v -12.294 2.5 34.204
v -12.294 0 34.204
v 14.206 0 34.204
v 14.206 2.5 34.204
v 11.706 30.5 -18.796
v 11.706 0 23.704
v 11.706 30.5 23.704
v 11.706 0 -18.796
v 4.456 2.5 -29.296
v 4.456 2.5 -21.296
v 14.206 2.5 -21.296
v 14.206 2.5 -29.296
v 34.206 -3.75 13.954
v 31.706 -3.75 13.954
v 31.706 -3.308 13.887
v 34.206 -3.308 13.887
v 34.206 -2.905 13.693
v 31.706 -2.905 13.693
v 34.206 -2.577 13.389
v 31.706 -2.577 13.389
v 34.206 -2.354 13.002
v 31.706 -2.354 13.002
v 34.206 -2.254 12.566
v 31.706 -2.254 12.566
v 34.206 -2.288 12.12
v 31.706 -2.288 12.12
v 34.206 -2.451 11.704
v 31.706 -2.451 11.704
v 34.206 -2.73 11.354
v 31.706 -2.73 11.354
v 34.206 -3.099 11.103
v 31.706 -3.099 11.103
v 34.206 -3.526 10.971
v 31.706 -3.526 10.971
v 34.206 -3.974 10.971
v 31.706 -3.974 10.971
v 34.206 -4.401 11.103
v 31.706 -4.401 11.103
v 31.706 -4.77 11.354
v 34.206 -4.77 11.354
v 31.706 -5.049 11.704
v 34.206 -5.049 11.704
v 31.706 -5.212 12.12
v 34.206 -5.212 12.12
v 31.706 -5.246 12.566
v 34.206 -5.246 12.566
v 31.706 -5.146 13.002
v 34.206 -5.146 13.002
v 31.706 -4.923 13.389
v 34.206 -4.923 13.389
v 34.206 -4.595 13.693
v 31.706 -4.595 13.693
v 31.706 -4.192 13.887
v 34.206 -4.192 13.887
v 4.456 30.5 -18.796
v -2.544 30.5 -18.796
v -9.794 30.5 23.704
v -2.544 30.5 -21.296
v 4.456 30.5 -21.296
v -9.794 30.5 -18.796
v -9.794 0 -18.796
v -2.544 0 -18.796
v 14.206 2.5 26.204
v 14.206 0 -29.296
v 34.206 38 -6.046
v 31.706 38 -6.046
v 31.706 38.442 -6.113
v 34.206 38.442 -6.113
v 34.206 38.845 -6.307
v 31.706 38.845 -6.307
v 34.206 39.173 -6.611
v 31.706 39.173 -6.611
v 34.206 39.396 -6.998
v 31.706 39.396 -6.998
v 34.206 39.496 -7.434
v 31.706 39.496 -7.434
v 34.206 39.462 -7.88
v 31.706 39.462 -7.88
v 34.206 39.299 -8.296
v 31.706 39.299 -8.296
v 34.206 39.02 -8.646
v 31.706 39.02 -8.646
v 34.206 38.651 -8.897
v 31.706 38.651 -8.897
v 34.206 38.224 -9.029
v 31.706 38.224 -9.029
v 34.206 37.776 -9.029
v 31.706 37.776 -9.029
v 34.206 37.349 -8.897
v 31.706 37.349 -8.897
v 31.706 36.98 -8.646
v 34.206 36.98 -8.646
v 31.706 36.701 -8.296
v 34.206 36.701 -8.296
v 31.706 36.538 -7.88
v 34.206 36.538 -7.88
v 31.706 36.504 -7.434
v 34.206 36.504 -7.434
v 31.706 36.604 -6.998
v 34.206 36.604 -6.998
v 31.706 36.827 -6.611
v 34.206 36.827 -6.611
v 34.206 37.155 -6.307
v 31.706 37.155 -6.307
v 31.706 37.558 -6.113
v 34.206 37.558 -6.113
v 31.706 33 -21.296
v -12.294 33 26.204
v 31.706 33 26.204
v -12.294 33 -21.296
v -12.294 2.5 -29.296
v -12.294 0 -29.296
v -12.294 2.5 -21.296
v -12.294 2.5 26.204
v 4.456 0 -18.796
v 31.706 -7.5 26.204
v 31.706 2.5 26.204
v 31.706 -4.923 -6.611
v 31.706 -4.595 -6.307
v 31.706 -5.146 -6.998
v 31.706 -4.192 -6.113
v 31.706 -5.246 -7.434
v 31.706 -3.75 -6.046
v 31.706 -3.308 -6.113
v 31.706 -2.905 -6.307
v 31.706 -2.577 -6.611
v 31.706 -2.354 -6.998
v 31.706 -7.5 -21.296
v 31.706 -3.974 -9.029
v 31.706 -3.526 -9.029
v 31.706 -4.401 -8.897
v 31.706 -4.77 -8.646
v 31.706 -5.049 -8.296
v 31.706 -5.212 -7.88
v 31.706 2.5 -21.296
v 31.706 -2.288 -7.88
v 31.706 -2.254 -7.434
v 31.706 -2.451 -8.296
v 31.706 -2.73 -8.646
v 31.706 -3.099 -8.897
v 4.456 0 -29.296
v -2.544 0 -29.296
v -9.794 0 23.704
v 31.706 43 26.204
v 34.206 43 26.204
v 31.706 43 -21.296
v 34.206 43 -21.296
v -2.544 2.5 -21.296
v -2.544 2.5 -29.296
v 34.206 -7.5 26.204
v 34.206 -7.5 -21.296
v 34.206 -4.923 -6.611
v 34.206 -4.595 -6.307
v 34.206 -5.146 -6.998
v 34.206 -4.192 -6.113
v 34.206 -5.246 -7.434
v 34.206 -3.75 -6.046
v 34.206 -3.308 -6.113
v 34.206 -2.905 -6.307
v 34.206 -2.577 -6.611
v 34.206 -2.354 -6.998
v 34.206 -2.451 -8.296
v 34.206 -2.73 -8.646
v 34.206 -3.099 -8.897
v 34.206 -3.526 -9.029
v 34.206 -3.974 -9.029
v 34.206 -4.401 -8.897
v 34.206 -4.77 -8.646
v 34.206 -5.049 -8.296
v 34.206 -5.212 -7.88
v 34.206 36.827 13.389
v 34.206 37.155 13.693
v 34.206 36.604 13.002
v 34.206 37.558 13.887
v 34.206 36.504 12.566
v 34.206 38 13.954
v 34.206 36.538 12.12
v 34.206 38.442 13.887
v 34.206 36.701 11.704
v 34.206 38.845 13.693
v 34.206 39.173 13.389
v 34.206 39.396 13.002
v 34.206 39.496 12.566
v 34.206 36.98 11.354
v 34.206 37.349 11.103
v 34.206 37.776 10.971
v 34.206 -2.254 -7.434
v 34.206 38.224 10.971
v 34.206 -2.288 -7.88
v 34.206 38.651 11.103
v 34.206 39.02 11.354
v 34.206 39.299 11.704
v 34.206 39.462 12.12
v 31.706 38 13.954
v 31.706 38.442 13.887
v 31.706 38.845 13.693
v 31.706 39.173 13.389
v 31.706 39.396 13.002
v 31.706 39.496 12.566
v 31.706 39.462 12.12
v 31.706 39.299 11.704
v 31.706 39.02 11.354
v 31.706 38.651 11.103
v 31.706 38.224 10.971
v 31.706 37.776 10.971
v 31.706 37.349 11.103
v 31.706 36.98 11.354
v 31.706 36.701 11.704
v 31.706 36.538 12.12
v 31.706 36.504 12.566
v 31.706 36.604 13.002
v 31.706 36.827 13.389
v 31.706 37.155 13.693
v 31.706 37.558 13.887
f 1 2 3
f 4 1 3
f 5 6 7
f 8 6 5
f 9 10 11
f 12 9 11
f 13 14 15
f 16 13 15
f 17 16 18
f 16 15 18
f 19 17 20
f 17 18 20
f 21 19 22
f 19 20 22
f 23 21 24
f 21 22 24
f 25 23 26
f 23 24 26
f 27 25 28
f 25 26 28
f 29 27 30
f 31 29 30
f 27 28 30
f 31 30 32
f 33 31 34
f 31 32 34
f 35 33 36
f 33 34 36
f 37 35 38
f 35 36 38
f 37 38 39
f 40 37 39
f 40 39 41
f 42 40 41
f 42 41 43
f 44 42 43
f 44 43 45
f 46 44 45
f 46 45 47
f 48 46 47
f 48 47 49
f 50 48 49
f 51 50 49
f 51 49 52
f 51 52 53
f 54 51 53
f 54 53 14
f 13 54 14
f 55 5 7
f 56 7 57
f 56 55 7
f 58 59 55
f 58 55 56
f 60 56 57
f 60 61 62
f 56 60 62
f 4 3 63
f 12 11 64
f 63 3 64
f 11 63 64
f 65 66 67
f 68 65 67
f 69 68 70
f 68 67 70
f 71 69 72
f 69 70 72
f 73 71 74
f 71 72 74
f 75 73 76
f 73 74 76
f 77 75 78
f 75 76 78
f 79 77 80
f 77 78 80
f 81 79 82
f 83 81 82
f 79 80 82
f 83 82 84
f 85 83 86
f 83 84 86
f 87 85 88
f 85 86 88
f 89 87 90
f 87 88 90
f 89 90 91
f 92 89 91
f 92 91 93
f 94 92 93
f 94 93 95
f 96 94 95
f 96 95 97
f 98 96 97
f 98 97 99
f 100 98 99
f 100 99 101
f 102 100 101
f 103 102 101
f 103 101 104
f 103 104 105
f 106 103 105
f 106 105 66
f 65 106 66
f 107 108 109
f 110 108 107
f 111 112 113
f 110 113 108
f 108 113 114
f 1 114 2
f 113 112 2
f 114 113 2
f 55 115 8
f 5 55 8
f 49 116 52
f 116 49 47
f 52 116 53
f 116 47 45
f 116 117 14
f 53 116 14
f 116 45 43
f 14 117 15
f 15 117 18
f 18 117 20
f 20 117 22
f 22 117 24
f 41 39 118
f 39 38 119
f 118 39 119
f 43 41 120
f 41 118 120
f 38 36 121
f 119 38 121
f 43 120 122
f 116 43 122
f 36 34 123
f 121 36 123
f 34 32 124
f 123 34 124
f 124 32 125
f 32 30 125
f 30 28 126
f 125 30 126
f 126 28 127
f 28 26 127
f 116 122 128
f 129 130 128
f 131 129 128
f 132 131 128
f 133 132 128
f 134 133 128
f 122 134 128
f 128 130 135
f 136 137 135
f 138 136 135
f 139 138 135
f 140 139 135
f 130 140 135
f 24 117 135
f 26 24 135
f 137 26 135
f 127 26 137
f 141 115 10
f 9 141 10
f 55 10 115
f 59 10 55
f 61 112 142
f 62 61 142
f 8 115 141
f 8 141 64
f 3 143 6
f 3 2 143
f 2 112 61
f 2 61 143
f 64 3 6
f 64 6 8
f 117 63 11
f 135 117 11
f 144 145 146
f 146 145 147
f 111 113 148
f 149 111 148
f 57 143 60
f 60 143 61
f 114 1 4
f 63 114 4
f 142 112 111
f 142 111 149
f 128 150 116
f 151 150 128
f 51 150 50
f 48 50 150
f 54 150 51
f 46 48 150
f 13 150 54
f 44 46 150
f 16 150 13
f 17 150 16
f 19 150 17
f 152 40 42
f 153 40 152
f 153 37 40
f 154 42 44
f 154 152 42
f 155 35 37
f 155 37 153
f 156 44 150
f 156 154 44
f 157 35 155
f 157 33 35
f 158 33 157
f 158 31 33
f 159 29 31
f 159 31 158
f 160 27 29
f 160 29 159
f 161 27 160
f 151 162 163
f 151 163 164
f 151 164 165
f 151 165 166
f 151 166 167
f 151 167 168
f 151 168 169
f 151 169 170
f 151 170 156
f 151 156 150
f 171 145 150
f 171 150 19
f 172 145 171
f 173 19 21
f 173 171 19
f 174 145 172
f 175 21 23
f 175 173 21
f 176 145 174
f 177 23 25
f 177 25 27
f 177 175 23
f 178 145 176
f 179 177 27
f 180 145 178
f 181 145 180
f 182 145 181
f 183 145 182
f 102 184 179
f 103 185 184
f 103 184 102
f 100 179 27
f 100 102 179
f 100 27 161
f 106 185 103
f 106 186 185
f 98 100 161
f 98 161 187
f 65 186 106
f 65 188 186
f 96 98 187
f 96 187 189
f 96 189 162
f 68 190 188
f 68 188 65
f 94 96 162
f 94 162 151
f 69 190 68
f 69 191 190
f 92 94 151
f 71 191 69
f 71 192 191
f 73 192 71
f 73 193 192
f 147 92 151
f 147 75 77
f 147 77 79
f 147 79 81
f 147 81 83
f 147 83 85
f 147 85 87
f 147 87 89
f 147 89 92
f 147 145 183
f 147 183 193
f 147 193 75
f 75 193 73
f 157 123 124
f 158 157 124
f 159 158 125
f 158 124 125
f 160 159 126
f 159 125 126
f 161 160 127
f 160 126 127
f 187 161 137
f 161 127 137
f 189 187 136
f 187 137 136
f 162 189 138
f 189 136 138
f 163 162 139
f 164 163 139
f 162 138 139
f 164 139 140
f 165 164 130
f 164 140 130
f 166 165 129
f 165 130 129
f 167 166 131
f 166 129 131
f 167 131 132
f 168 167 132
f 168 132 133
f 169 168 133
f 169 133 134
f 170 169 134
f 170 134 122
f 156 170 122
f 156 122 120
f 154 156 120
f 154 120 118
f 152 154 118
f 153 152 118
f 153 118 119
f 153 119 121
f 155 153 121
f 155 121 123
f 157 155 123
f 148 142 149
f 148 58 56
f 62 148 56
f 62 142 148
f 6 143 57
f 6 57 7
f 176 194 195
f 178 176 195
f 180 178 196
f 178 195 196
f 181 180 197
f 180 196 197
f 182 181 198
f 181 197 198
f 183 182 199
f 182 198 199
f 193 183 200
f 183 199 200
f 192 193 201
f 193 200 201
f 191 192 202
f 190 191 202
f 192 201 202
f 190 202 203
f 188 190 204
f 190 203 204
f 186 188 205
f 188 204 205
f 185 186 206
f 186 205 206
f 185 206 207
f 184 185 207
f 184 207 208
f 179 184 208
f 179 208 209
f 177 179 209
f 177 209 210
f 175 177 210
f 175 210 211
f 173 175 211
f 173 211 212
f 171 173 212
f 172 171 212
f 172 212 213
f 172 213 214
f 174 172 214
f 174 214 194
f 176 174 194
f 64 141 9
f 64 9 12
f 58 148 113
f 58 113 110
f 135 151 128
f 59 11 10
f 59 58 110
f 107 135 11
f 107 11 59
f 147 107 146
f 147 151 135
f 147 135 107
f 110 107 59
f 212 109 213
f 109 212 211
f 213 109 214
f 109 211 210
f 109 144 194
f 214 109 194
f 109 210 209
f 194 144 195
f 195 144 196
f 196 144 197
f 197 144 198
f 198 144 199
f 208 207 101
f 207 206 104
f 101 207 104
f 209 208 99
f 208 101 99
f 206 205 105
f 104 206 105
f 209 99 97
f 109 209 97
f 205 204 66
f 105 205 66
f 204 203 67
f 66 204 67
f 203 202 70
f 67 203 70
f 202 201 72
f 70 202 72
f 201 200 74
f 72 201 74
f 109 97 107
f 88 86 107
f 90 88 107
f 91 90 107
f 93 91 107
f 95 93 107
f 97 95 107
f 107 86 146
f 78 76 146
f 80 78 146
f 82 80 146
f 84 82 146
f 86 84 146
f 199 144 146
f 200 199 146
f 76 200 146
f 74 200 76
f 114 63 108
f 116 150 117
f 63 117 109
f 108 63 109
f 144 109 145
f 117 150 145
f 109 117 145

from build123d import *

# Parameters (mm, degrees)
SKETCH1_W           = 26.5
SKETCH1_H           = 47.5
SKETCH1_W_2         = 21.5
SKETCH1_H_2         = 42.5
BOSS_EXTRUDE1_DEPTH = 33
SKETCH2_W           = 21.5
SKETCH2_H           = 42.5
BOSS_EXTRUDE2_DEPTH = 2.5
CUT_EXTRUDE2_DEPTH  = 2.5
SKETCH4_W           = 9.75
SKETCH4_H           = 8
SKETCH4_W_2         = 26.5
BOSS_EXTRUDE3_DEPTH = 2.5
SKETCH7_W           = 47.5
SKETCH7_H           = 30.5
BOSS_EXTRUDE5_DEPTH = 20
SKETCH8_W           = 47.5
SKETCH8_H           = 10
BOSS_EXTRUDE6_DEPTH = 2.5
SKETCH9_R           = 1.5
CUT_EXTRUDE3_DEPTH  = 21.5


with BuildPart() as part:
    # Sketch1 → Boss-Extrude1 (new body)
    with BuildSketch(Plane(origin=(0, 0, 0), x_dir=(1, 0, 0), z_dir=(0, 1, 0))):
        with Locations((0.956397274, -2.454043299)):
            Rectangle(SKETCH1_W, SKETCH1_H)
        with Locations((0.956397274, -2.454043299)):
            Rectangle(SKETCH1_W_2, SKETCH1_H_2, mode=Mode.SUBTRACT)
    extrude(amount=BOSS_EXTRUDE1_DEPTH)

    # Sketch2 → Boss-Extrude2 (add)
    with BuildSketch(Plane(origin=(0, 33, 0), x_dir=(1, 0, 0), z_dir=(0, 1, 0))):
        with Locations((0.956397274, -2.454043299)):
            Rectangle(SKETCH2_W, SKETCH2_H)
    extrude(amount=-BOSS_EXTRUDE2_DEPTH)

    # Sketch3 → Cut-Extrude2 (cut)
    with BuildSketch(Plane(origin=(0, 0, -21.295956701), x_dir=(-1, 0, 0), z_dir=(0, 0, -1))):
        Polygon((2.543602726, 30.5), (2.543602726, 0), (-0.956397274, 0), (-4.456397274, 0), (-4.456397274, 30.5), align=None)
    extrude(amount=-CUT_EXTRUDE2_DEPTH, mode=Mode.SUBTRACT)

    # Sketch4 → Boss-Extrude3 (add)
    with BuildSketch(Plane.XZ):
        with Locations((-7.418602726, -25.295956701)):
            Rectangle(SKETCH4_W, SKETCH4_H)
        with Locations((0.956397274, 30.204043299)):
            Rectangle(SKETCH4_W_2, SKETCH4_H)
        with Locations((9.331397274, -25.295956701)):
            Rectangle(SKETCH4_W, SKETCH4_H)
    extrude(amount=-BOSS_EXTRUDE3_DEPTH)

    # Sketch7 → Boss-Extrude5 (add)
    with BuildSketch(Plane(origin=(14.206397274, 0, 0), x_dir=(0, 0, -1), z_dir=(1, 0, 0))):
        with Locations((-2.454043299, 17.75)):
            Rectangle(SKETCH7_W, SKETCH7_H)
    extrude(amount=BOSS_EXTRUDE5_DEPTH)

    # Sketch8 → Boss-Extrude6 (add)
    with BuildSketch(Plane(origin=(34.206397274, 0, 0), x_dir=(0, 0, -1), z_dir=(1, 0, 0))):
        with Locations((-2.454043299, 38)):
            Rectangle(SKETCH8_W, SKETCH8_H)
        with Locations((-2.454043299, -2.5)):
            Rectangle(SKETCH8_W, SKETCH8_H)
    extrude(amount=-BOSS_EXTRUDE6_DEPTH)

    # Sketch9 → Cut-Extrude3 (cut)
    with BuildSketch(Plane.ZY.offset(-31.706397274)):
        with Locations((-7.545956701, -3.75)):
            Circle(SKETCH9_R)
        with Locations((12.454043299, -3.75)):
            Circle(SKETCH9_R)
        with Locations((-7.545956701, 38)):
            Circle(SKETCH9_R)
        with Locations((12.454043299, 38)):
            Circle(SKETCH9_R)
    extrude(amount=-CUT_EXTRUDE3_DEPTH, mode=Mode.SUBTRACT)


solid = part.part
